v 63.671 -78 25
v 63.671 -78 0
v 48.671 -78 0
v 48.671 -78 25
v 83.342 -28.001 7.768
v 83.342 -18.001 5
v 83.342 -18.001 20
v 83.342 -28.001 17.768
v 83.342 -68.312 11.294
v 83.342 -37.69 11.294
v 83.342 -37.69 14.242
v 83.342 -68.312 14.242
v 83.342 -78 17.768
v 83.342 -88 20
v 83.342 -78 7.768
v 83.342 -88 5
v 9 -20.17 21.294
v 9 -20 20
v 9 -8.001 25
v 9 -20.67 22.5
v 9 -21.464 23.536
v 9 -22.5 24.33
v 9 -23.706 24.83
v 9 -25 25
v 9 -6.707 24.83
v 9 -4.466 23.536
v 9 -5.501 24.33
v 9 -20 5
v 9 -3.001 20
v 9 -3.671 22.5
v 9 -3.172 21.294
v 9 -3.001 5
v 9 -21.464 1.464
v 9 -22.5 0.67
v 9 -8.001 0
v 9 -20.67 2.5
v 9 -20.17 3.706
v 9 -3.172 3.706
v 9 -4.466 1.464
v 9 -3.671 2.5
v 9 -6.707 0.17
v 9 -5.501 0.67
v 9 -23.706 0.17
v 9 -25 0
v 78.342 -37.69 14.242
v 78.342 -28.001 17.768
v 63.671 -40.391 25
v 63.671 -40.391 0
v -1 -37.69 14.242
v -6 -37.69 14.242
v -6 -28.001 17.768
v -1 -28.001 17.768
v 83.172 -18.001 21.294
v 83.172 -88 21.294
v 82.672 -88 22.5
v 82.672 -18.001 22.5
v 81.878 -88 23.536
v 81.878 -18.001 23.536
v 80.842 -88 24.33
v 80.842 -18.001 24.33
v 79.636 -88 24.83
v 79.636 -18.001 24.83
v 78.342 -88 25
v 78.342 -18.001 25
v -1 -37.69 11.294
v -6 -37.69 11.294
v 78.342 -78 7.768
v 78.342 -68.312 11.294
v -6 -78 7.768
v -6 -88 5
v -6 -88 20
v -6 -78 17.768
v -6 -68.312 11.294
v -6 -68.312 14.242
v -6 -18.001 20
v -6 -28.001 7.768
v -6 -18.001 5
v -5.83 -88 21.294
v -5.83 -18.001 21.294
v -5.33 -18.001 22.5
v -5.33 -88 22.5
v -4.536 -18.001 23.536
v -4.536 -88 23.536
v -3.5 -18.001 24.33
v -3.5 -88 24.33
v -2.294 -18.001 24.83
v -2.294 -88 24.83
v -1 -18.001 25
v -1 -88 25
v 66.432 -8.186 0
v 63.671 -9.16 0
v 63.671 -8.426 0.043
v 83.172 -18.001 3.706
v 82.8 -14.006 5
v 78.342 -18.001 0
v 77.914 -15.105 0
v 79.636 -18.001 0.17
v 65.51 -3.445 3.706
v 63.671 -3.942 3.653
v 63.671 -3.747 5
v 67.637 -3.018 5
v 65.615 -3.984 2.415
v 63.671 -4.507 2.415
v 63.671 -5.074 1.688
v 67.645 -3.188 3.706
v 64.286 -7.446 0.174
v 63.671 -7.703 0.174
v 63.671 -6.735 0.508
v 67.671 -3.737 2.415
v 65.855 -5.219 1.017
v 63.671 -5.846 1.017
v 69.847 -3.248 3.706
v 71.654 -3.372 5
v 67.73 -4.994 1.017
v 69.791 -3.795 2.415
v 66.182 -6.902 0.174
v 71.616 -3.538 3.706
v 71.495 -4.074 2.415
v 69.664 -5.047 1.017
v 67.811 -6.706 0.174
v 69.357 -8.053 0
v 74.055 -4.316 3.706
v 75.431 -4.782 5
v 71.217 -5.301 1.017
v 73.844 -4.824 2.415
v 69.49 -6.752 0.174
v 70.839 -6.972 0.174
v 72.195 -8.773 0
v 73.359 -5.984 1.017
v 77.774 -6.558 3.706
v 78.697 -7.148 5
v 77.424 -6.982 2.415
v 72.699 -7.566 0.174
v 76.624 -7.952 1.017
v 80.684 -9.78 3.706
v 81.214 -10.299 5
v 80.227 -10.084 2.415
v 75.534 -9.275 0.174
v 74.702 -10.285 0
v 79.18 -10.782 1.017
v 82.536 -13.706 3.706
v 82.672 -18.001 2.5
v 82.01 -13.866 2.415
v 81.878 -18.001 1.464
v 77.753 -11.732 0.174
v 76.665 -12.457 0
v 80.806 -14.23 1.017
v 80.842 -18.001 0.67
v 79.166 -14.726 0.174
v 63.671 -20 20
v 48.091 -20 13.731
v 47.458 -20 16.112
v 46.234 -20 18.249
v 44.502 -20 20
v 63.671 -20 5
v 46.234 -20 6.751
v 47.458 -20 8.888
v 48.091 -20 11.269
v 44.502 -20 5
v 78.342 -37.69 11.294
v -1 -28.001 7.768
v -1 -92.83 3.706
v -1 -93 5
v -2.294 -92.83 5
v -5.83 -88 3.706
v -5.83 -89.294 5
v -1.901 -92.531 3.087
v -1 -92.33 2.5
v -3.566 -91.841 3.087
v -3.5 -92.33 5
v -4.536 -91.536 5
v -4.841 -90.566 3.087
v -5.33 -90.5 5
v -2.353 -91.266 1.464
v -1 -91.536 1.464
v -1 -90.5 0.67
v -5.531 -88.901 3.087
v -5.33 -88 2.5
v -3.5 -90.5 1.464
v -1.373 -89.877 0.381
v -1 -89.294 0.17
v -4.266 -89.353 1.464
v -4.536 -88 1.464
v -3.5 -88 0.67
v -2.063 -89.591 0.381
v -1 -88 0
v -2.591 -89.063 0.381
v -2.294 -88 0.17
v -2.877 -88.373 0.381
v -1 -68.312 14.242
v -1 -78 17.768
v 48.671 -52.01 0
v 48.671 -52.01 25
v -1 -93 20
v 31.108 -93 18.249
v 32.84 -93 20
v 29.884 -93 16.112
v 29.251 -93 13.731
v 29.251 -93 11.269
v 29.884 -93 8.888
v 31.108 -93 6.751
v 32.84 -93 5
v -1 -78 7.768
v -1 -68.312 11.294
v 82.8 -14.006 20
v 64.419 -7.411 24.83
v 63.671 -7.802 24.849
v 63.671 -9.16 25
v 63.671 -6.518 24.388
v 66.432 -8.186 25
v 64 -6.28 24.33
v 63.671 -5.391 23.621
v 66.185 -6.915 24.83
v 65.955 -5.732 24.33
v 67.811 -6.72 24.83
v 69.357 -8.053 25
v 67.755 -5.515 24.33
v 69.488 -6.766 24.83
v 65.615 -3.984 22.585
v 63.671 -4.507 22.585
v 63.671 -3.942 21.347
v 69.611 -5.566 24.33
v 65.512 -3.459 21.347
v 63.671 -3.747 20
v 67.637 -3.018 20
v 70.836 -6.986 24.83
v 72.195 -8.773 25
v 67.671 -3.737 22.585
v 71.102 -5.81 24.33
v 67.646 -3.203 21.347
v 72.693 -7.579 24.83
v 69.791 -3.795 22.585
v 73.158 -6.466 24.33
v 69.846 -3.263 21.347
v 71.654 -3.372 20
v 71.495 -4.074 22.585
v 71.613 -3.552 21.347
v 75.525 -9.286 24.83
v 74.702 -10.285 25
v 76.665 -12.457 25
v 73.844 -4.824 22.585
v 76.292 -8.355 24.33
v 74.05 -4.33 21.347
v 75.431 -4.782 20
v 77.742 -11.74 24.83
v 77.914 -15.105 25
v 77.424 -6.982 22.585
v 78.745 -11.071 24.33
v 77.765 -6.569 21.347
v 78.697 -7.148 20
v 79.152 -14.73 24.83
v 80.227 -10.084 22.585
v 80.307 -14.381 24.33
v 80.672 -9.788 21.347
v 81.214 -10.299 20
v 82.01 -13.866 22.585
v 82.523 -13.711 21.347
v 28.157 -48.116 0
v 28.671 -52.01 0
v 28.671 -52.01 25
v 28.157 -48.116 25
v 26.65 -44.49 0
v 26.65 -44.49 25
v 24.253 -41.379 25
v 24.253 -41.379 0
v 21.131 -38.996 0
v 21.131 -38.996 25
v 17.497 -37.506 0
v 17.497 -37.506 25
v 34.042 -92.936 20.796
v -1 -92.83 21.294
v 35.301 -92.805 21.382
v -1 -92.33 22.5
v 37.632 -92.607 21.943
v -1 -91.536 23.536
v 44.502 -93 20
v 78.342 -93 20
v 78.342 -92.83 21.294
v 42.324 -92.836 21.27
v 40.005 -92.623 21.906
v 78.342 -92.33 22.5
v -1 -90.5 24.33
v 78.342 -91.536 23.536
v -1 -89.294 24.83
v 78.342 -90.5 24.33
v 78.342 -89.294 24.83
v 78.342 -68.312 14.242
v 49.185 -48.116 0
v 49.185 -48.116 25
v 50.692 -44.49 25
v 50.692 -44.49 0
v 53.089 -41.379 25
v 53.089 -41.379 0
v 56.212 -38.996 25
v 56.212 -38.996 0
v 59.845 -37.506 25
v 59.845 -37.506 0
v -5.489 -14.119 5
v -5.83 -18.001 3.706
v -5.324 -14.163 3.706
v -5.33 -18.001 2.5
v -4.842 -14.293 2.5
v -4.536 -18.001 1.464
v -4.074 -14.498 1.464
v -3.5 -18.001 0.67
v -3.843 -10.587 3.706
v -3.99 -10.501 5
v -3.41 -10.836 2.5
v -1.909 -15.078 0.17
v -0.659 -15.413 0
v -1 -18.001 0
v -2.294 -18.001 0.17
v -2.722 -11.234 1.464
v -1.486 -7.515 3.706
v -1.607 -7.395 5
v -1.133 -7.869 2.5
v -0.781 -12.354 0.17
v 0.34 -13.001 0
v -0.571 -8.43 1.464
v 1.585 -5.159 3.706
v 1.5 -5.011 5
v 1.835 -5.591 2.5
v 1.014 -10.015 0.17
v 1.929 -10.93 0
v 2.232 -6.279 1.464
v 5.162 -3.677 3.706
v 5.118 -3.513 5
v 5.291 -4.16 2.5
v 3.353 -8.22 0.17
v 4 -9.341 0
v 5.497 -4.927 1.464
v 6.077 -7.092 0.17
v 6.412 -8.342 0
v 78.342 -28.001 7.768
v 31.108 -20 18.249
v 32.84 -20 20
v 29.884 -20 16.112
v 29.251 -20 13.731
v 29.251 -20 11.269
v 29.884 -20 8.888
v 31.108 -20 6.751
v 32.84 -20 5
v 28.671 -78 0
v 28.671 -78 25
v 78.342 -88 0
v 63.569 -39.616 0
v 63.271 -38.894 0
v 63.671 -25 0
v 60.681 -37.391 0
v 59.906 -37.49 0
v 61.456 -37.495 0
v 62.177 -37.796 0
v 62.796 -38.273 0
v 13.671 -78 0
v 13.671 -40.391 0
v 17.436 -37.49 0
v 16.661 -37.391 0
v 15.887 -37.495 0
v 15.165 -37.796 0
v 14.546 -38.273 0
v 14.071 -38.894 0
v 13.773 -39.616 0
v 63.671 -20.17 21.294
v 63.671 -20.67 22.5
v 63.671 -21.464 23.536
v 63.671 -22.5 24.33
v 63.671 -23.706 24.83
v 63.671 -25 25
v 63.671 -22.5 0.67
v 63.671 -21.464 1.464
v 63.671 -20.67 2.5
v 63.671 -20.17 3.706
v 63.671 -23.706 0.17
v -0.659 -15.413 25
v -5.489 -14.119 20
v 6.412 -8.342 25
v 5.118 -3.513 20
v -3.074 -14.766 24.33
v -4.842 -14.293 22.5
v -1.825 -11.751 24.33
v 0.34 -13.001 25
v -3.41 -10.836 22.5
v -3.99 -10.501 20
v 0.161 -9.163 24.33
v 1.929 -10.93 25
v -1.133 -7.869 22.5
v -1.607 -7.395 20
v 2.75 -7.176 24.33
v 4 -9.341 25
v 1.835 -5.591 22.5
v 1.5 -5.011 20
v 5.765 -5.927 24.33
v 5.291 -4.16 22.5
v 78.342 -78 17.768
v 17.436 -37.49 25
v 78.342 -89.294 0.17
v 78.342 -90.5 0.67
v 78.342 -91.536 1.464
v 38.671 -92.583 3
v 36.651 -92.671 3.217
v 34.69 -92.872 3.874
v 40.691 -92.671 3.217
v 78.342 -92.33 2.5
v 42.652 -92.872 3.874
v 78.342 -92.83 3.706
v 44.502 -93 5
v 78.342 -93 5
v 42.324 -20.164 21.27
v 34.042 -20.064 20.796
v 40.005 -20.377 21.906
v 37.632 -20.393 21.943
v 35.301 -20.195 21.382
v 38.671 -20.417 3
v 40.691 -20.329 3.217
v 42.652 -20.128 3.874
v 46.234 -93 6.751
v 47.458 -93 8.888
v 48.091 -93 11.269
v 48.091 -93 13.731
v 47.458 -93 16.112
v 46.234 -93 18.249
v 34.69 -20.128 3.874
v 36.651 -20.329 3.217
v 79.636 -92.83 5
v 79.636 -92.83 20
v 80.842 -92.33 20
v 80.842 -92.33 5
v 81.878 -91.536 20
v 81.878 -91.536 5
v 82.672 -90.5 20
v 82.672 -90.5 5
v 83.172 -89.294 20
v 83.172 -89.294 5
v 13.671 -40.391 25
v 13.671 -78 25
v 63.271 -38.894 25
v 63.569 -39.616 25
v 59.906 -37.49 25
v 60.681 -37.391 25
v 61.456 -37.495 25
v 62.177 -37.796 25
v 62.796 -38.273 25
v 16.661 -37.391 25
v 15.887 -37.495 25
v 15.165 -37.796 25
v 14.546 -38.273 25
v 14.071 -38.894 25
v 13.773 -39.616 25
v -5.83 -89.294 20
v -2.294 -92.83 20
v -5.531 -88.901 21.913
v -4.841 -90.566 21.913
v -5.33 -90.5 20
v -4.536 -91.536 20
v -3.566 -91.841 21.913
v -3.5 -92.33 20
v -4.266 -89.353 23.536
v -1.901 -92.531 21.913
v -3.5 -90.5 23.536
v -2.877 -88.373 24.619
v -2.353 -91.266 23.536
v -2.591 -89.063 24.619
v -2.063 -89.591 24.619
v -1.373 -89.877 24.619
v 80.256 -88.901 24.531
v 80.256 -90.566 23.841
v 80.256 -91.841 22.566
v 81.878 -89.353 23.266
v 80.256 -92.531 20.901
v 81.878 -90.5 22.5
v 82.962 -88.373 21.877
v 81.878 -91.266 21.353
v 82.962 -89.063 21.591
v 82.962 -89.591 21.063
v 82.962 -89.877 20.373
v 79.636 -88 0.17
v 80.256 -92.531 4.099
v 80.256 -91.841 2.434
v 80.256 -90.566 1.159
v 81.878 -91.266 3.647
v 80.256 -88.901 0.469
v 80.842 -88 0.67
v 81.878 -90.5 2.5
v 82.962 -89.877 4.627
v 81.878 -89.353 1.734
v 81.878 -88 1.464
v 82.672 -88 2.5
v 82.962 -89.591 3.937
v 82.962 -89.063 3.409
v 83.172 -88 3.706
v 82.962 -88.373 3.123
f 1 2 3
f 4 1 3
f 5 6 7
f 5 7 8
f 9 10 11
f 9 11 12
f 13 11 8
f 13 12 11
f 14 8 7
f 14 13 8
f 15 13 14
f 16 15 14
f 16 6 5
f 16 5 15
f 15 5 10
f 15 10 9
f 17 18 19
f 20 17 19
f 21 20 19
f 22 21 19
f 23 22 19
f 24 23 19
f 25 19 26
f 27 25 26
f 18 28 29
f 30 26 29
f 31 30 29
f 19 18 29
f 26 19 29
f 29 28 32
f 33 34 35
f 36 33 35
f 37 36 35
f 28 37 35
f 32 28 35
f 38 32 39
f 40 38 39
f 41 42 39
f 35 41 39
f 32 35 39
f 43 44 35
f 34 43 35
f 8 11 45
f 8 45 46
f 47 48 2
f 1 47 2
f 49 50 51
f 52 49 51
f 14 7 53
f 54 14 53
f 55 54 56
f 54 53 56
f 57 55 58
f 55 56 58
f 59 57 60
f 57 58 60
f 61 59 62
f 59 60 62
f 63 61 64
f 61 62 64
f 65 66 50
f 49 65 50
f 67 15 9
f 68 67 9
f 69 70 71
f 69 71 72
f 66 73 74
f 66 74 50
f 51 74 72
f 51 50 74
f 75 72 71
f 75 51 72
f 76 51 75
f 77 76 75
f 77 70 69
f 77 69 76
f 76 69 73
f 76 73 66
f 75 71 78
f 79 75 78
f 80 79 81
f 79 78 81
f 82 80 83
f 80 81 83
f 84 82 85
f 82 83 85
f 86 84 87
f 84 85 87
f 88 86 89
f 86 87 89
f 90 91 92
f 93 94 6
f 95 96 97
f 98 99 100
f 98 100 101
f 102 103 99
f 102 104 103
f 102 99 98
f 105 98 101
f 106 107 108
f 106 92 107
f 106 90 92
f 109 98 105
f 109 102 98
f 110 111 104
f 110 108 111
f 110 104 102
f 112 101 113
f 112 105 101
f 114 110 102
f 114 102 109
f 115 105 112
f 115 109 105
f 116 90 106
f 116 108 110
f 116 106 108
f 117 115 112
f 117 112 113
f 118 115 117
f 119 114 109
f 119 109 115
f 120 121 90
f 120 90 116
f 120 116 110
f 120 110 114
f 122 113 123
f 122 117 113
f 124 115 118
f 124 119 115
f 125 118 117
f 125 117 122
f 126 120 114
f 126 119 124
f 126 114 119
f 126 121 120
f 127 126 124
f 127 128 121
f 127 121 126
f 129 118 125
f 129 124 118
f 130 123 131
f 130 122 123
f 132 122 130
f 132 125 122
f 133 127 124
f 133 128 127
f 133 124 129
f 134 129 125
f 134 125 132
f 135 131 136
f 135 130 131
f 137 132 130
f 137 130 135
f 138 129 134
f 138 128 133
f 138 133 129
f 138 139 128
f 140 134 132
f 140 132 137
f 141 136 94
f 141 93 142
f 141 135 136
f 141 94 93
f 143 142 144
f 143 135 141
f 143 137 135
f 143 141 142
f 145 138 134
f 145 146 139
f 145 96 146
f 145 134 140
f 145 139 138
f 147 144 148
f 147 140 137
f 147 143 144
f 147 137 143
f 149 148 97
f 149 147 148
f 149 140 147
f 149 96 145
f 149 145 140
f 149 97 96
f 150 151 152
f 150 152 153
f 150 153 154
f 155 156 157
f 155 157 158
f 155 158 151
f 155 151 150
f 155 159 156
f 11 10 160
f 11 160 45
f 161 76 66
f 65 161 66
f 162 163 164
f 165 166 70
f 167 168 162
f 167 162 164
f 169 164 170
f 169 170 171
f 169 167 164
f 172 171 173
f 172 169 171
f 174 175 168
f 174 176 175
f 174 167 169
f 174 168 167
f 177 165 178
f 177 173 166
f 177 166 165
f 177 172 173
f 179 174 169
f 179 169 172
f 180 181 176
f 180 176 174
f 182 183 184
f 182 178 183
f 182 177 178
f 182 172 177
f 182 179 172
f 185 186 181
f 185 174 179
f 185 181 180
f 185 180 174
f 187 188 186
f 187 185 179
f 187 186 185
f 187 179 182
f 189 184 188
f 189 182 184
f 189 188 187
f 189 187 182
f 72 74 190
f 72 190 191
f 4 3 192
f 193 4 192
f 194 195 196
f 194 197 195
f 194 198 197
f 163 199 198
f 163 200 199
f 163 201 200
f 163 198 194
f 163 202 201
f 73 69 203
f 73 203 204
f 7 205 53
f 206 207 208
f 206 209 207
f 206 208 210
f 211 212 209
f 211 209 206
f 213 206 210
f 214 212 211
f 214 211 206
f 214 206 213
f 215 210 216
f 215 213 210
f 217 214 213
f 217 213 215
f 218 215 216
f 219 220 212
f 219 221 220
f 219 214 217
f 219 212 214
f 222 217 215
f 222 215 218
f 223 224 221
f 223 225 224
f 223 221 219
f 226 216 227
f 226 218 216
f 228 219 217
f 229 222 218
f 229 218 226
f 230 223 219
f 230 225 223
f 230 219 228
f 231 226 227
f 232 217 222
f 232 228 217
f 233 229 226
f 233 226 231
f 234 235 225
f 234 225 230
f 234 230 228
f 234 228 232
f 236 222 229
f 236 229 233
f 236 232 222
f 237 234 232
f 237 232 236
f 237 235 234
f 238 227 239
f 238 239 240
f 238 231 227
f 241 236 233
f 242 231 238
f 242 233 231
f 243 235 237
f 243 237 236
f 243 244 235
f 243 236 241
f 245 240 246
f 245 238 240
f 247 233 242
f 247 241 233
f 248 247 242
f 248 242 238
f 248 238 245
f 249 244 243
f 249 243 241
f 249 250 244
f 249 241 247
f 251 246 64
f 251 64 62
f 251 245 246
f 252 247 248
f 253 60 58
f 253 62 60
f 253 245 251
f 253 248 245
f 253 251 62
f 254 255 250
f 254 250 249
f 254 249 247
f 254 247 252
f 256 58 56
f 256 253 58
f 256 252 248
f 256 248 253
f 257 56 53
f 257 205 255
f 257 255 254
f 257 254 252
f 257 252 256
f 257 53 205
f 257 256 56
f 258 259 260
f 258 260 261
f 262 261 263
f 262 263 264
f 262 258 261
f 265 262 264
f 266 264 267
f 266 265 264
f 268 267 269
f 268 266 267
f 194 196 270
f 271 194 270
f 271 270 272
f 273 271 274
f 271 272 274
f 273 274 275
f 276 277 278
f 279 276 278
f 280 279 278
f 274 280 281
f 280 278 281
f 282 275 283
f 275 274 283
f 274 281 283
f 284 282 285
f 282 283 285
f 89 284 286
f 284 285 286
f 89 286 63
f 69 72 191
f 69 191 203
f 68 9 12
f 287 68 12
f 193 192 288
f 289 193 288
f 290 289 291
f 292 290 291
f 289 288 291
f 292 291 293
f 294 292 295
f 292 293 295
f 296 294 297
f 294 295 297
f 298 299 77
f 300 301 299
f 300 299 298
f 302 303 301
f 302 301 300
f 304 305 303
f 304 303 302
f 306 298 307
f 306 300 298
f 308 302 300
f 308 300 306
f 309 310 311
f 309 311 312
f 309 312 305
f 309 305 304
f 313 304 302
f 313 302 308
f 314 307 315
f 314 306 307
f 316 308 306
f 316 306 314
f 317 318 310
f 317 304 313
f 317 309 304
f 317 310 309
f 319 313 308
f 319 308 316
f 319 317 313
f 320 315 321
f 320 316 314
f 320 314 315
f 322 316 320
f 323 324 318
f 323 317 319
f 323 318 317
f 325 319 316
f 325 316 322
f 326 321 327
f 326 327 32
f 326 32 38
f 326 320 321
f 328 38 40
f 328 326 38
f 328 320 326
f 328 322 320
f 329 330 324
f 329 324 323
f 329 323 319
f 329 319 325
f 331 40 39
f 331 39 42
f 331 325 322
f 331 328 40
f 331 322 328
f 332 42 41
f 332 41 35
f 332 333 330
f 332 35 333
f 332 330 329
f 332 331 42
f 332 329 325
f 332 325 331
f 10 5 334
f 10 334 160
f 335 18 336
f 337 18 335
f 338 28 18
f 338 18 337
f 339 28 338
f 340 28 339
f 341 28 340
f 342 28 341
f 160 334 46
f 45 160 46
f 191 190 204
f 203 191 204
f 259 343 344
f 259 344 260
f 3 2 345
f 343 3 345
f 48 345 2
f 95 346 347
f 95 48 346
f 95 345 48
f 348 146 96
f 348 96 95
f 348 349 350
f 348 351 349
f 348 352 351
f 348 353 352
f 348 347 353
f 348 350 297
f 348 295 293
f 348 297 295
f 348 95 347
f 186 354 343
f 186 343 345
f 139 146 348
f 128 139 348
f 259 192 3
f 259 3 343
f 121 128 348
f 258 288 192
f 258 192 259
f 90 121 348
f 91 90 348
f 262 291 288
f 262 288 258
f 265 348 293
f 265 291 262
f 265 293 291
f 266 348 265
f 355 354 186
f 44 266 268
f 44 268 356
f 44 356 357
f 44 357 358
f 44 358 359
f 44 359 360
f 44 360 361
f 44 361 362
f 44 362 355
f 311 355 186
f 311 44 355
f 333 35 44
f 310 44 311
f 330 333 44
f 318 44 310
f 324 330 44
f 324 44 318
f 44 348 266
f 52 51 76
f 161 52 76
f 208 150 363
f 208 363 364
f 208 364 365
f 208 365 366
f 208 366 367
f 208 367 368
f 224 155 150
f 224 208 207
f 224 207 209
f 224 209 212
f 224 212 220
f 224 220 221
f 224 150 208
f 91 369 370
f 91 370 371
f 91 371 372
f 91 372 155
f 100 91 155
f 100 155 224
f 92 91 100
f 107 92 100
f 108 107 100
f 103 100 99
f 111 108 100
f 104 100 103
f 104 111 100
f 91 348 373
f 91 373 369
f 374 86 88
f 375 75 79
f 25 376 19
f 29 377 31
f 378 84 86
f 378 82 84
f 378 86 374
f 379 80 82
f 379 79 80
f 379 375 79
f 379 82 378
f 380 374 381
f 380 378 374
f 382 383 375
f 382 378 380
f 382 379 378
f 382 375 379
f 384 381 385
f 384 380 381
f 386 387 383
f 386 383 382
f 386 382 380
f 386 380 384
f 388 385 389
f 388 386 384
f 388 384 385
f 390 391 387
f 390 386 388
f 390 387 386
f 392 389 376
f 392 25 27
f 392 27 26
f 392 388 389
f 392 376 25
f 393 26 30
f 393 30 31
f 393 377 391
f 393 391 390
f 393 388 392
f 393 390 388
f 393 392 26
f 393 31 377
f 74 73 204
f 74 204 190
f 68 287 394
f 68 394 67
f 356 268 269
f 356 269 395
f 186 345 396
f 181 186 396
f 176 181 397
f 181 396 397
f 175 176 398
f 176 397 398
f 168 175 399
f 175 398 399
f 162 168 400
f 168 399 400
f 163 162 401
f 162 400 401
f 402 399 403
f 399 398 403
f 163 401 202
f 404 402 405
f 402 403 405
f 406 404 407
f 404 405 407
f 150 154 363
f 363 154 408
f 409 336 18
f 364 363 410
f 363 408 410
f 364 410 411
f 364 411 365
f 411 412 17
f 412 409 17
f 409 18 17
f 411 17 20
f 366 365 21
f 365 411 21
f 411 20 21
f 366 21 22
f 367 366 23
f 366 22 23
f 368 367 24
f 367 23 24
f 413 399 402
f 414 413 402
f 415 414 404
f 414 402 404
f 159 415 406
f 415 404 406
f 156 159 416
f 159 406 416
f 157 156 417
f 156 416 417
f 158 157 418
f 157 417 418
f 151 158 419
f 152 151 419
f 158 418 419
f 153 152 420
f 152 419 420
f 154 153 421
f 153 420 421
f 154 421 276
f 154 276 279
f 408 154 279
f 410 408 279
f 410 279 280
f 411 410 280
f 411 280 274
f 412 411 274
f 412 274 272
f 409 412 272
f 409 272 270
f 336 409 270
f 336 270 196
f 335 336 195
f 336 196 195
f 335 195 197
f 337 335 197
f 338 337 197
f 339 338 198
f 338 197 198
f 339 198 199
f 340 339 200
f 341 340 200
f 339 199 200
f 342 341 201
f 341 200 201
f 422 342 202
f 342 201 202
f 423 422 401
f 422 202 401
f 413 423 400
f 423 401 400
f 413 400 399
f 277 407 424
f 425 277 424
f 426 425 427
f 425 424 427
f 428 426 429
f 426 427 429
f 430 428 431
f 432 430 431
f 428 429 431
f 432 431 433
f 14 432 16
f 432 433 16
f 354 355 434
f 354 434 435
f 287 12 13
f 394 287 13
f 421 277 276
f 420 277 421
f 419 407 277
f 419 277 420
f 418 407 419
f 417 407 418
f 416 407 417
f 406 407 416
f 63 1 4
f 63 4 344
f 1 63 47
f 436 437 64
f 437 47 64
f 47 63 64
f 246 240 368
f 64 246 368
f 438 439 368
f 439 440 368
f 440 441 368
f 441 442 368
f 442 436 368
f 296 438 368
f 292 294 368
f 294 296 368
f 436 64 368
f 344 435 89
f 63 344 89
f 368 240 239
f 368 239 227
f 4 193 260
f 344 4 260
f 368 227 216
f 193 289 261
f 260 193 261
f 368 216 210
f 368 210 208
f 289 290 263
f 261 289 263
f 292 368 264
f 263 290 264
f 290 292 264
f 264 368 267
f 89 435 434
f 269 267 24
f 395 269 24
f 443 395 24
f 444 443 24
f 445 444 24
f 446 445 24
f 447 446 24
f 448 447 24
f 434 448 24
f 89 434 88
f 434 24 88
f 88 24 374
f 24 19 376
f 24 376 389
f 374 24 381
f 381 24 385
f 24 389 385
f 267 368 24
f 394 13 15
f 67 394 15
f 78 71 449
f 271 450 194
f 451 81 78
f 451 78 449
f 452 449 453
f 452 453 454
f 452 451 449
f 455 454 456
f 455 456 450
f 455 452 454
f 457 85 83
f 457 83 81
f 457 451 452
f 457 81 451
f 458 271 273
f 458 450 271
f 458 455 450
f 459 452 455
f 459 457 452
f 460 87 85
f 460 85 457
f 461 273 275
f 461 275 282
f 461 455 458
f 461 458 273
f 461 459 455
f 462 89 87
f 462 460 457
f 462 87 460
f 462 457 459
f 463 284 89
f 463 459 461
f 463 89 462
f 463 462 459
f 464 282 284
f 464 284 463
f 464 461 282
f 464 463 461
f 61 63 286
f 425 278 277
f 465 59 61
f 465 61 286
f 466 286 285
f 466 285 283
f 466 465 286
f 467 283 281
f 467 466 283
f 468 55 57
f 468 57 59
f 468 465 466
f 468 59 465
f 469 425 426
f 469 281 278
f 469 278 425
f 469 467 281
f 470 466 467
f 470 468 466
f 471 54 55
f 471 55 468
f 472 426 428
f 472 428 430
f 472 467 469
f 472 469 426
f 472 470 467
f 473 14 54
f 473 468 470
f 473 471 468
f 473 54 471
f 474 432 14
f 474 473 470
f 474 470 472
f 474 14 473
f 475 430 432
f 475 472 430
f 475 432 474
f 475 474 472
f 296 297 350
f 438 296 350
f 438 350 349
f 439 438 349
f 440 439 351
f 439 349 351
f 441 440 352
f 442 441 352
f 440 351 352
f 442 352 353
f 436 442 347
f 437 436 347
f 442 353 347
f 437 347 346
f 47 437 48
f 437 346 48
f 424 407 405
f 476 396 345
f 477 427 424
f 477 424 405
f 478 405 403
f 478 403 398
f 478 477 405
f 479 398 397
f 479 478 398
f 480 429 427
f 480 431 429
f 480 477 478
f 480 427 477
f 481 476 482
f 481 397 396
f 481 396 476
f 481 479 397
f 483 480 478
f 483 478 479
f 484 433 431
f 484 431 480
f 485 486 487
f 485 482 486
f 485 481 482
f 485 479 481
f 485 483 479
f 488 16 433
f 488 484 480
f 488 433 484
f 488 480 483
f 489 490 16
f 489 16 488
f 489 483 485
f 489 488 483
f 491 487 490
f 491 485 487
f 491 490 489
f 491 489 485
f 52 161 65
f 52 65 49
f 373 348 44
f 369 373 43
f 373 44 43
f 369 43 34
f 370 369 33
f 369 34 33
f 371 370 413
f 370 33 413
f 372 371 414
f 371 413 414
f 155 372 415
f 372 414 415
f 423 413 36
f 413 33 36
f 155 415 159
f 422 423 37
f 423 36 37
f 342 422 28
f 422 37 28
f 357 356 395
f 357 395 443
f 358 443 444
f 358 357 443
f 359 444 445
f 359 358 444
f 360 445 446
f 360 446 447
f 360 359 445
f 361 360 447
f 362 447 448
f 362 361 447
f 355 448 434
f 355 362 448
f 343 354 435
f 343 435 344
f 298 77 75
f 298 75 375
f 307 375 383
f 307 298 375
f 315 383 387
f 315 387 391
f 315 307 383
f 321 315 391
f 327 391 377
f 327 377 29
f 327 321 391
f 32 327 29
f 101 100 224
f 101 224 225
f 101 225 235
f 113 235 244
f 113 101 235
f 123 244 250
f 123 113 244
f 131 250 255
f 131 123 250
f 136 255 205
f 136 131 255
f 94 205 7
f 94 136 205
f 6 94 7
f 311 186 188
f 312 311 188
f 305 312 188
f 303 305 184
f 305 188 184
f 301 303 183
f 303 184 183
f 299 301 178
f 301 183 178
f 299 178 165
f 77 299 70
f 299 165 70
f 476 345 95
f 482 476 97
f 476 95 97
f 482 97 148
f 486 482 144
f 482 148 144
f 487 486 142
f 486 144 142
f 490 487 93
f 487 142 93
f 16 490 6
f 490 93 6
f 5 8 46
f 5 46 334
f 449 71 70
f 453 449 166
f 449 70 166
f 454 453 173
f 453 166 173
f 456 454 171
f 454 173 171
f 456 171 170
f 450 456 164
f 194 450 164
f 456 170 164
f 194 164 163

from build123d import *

# Parameters (mm, degrees)
BOSS_EXTRUDE1_DEPTH = 25
SKETCH2_R           = 9.5
CUT_EXTRUDE1_DEPTH  = 89
FILLET1_R           = 5
FILLET2_R           = 5
FILLET3_R           = 5
CUT_EXTRUDE2_DEPTH  = 5


with BuildPart() as part:
    # Sketch1 → Boss-Extrude1 (new body)
    with BuildSketch(Plane.XY):
        with BuildLine():
            Line((83.342336402, -18.001464661), (83.342336402, -93))
            Line((83.342336402, -93), (-6, -93))
            Line((-6, -93), (-6, -18.001464661))
            ThreePointArc((-6, -18.001464661), (-1.606601718, -7.394862943), (9, -3.001464661))
            Line((9, -3.001464661), (9, -20))
            Line((9, -20), (63.671168201, -20))
            Line((63.671168201, -20), (63.671168201, -3.747335869))
            ThreePointArc((63.671168201, -3.747335869), (77.143827099, -5.855117), (83.342336402, -18.001464661))
        make_face()
        with BuildLine():
            Line((63.671168201, -40.39084965), (63.671168201, -78))
            Line((63.671168201, -78), (48.671168201, -78))
            Line((48.671168201, -78), (48.671168201, -52.009969466))
            ThreePointArc((48.671168201, -52.009969466), (51.788643958, -42.855428646), (59.845250549, -37.506095703))
            Line((59.845250549, -37.506095703), (59.905984671, -37.490074897))
            ThreePointArc((59.905984671, -37.490074897), (62.502076365, -38.014344801), (63.671168201, -40.39084965))
        make_face(mode=Mode.SUBTRACT)
        with BuildLine():
            Line((28.671168201, -78), (28.671168201, -52.009969466))
            ThreePointArc((28.671168201, -52.009969466), (25.553692444, -42.855428646), (17.497085853, -37.506095703))
            Line((17.497085853, -37.506095703), (17.436351731, -37.490074897))
            ThreePointArc((17.436351731, -37.490074897), (14.840260037, -38.014344801), (13.671168201, -40.39084965))
            Line((13.671168201, -40.39084965), (13.671168201, -78))
            Line((13.671168201, -78), (28.671168201, -78))
        make_face(mode=Mode.SUBTRACT)
    extrude(amount=BOSS_EXTRUDE1_DEPTH)

    # Sketch2 → Cut-Extrude1 (cut)
    with BuildSketch(Plane.XZ.offset(93)):
        with Locations(Location((38.671168201, 12.5, 0), (0, 0, 270))):
            Circle(SKETCH2_R)
    extrude(amount=-CUT_EXTRUDE1_DEPTH, mode=Mode.SUBTRACT)

    # Fillet1
    # the kernel refuses this fillet: 5 mm, written as the material it takes off along each edge
    with BuildSketch(Plane(origin=(95.842336402, -93, 0), x_dir=(0, 1, 0), z_dir=(-1, 0, 0))) as fillet1_piece_1:
        with BuildLine():
            CenterArc((FILLET1_R, -FILLET1_R), FILLET1_R, 90, 90)
            Line((0, -FILLET1_R), (0, 0))
            Line((0, 0), (FILLET1_R, 0))
        make_face()
    extrude(amount=114.342336402, mode=Mode.SUBTRACT)
    with BuildSketch(Plane(origin=(83.342336402, -93, -12.5), x_dir=(0, 1, 0), z_dir=(0, 0, 1)), Plane(origin=(-6, -93, -12.5), x_dir=(1, 0, 0), z_dir=(0, 0, 1))) as fillet1_piece_2:
        with BuildLine():
            CenterArc((FILLET1_R, FILLET1_R), FILLET1_R, 180, 90)
            Line((0, FILLET1_R), (0, 0))
            Line((0, 0), (FILLET1_R, 0))
        make_face()
    extrude(amount=50, mode=Mode.SUBTRACT)
    with BuildSketch(Plane(origin=(95.842336402, -93, 25), x_dir=(0, 1, 0), z_dir=(-1, 0, 0))) as fillet1_piece_3:
        with BuildLine():
            CenterArc((FILLET1_R, FILLET1_R), FILLET1_R, 180, 90)
            Line((0, FILLET1_R), (0, 0))
            Line((0, 0), (FILLET1_R, 0))
        make_face()
    extrude(amount=114.342336402, mode=Mode.SUBTRACT)

    # Fillet2
    # the kernel refuses this fillet: 5 mm, written as the material it takes off along each edge
    with BuildSketch(Plane(origin=(78.342336402, -88, 20), x_dir=(0, 0, 1), z_dir=(1, 0, 0))) as fillet2_piece_1_section:
        Polygon((0, 0), (FILLET2_R * 1.02, 0), (FILLET2_R * 1.02, FILLET2_R * 1.02), (0, FILLET2_R * 1.02), align=None)
    fillet2_piece_1 = extrude(amount=FILLET2_R * 1.02, mode=Mode.PRIVATE)
    fillet2_piece_1 = fillet2_piece_1 - Plane(origin=(78.342336402, -88, 20), x_dir=(0, 0.7071067811865475, -0.7071067811865475), z_dir=(1, 0, 0)) * Sphere(FILLET2_R, mode=Mode.PRIVATE)
    add(fillet2_piece_1, mode=Mode.SUBTRACT)
    with BuildSketch(Plane(origin=(78.342336402, -88, 5), x_dir=(0, 0, -1), z_dir=(1, 0, 0))) as fillet2_piece_2_section:
        Polygon((0, 0), (FILLET2_R * 1.02, 0), (FILLET2_R * 1.02, -FILLET2_R * 1.02), (0, -FILLET2_R * 1.02), align=None)
    fillet2_piece_2 = extrude(amount=FILLET2_R * 1.02, mode=Mode.PRIVATE)
    fillet2_piece_2 = fillet2_piece_2 - Plane(origin=(78.342336402, -88, 5), x_dir=(0, 0.7071067811865475, 0.7071067811865475), z_dir=(1, 0, 0)) * Sphere(FILLET2_R, mode=Mode.PRIVATE)
    add(fillet2_piece_2, mode=Mode.SUBTRACT)
    with BuildSketch(Plane(origin=(-1, -88, 20), x_dir=(-1, 0, 0), z_dir=(0, 0, 1))) as fillet2_piece_3_section:
        Polygon((0, 0), (FILLET2_R * 1.02, 0), (FILLET2_R * 1.02, FILLET2_R * 1.02), (0, FILLET2_R * 1.02), align=None)
    fillet2_piece_3 = extrude(amount=FILLET2_R * 1.02, mode=Mode.PRIVATE)
    fillet2_piece_3 = fillet2_piece_3 - Plane(origin=(-1, -88, 20), x_dir=(0.7071067811865476, 0.7071067811865475, 0), z_dir=(0, 0, 1)) * Sphere(FILLET2_R, mode=Mode.PRIVATE)
    add(fillet2_piece_3, mode=Mode.SUBTRACT)
    with BuildSketch(Plane(origin=(-1, -88, 5), x_dir=(-1, 0, 0), z_dir=(0, 0, -1))) as fillet2_piece_4_section:
        Polygon((0, 0), (FILLET2_R * 1.02, 0), (FILLET2_R * 1.02, -FILLET2_R * 1.02), (0, -FILLET2_R * 1.02), align=None)
    fillet2_piece_4 = extrude(amount=FILLET2_R * 1.02, mode=Mode.PRIVATE)
    fillet2_piece_4 = fillet2_piece_4 - Plane(origin=(-1, -88, 5), x_dir=(0.7071067811865476, 0.7071067811865475, 0), z_dir=(0, 0, -1)) * Sphere(FILLET2_R, mode=Mode.PRIVATE)
    add(fillet2_piece_4, mode=Mode.SUBTRACT)
    with BuildSketch(Plane(origin=(68.342336402, -18.001464661, 0), x_dir=(-0.9129658100806721, 0.4080360641214722, 0), z_dir=(-0.4080360641214722, -0.9129658100806721, 0))) as fillet2_piece_5_section:
        with BuildLine():
            CenterArc((15 - FILLET2_R, -FILLET2_R), FILLET2_R, 0, 90)
            Line((15 - FILLET2_R, 0), (15 - FILLET2_R, FILLET2_R * 0.02))
            Line((15 - FILLET2_R, FILLET2_R * 0.02), (15 + FILLET2_R * 0.02, FILLET2_R * 0.02))
            Line((15 + FILLET2_R * 0.02, FILLET2_R * 0.02), (15 + FILLET2_R * 0.02, -FILLET2_R))
            Line((15 + FILLET2_R * 0.02, -FILLET2_R), (15, -FILLET2_R))
        make_face()
    fillet2_piece_5 = revolve(axis=Axis((68.342336402, -18.001464661, 0), (0, 0, -1)), revolution_arc=155.918477011, mode=Mode.PRIVATE)
    fillet2_piece_5 = split(fillet2_piece_5, bisect_by=Plane(origin=(63.671168201, -6.375046545, 1.425351683), z_dir=(1, 0, 0)), keep=Keep.TOP, mode=Mode.PRIVATE)
    add(fillet2_piece_5, mode=Mode.SUBTRACT)
    with BuildSketch(Plane(origin=(-6, -88, 0), x_dir=(1, 0, 0), z_dir=(0, 1, 0)), Plane(origin=(83.342336402, -18.001464661, 25), x_dir=(0, 0, -1), z_dir=(0, -1, 0))) as fillet2_piece_6:
        with BuildLine():
            CenterArc((FILLET2_R, -FILLET2_R), FILLET2_R, 90, 90)
            Line((0, -FILLET2_R), (-FILLET2_R * 0.02, -FILLET2_R))
            Line((-FILLET2_R * 0.02, -FILLET2_R), (-FILLET2_R * 0.02, FILLET2_R * 0.02))
            Line((-FILLET2_R * 0.02, FILLET2_R * 0.02), (FILLET2_R, FILLET2_R * 0.02))
            Line((FILLET2_R, FILLET2_R * 0.02), (FILLET2_R, 0))
        make_face()
    extrude(amount=69.998535339, mode=Mode.SUBTRACT)
    with BuildSketch(Plane(origin=(68.342336402, -18.001464661, 25), x_dir=(-0.9129658100806721, 0.4080360641214721, 0), z_dir=(-0.4080360641214721, -0.9129658100806721, 0))) as fillet2_piece_7_section:
        with BuildLine():
            CenterArc((15 - FILLET2_R, FILLET2_R), FILLET2_R, 270, 90)
            Line((15 - FILLET2_R, 0), (15 - FILLET2_R, -FILLET2_R * 0.02))
            Line((15 - FILLET2_R, -FILLET2_R * 0.02), (15 + FILLET2_R * 0.02, -FILLET2_R * 0.02))
            Line((15 + FILLET2_R * 0.02, -FILLET2_R * 0.02), (15 + FILLET2_R * 0.02, FILLET2_R))
            Line((15 + FILLET2_R * 0.02, FILLET2_R), (15, FILLET2_R))
        make_face()
    fillet2_piece_7 = revolve(axis=Axis((68.342336402, -18.001464661, 25), (0, 0, -1)), revolution_arc=155.918477011, mode=Mode.PRIVATE)
    fillet2_piece_7 = split(fillet2_piece_7, bisect_by=Plane(origin=(63.671168201, -6.375046545, 23.574648317), z_dir=(1, 0, 0)), keep=Keep.TOP, mode=Mode.PRIVATE)
    add(fillet2_piece_7, mode=Mode.SUBTRACT)
    with BuildSketch(Plane(origin=(9, -18.001464661, 25), x_dir=(-1, 0, 0), z_dir=(0, -1, 0))) as fillet2_piece_8:
        with BuildLine():
            CenterArc((15 - FILLET2_R, FILLET2_R), FILLET2_R, 270, 90)
            Line((15, FILLET2_R), (15 + FILLET2_R * 0.02, FILLET2_R))
            Line((15 + FILLET2_R * 0.02, FILLET2_R), (15 + FILLET2_R * 0.02, -FILLET2_R * 0.02))
            Line((15 + FILLET2_R * 0.02, -FILLET2_R * 0.02), (15 - FILLET2_R, -FILLET2_R * 0.02))
            Line((15 - FILLET2_R, -FILLET2_R * 0.02), (15 - FILLET2_R, 0))
        make_face()
    revolve(axis=Axis((9, -18.001464661, 25), (0, 0, -1)), revolution_arc=90, mode=Mode.SUBTRACT)
    with BuildSketch(Plane(origin=(-6, -88, 25), x_dir=(1, 0, 0), z_dir=(0, 1, 0)), Plane(origin=(83.342336402, -18.001464661, 0), x_dir=(0, 0, 1), z_dir=(0, -1, 0))) as fillet2_piece_9:
        with BuildLine():
            CenterArc((FILLET2_R, FILLET2_R), FILLET2_R, 180, 90)
            Line((0, FILLET2_R), (-FILLET2_R * 0.02, FILLET2_R))
            Line((-FILLET2_R * 0.02, FILLET2_R), (-FILLET2_R * 0.02, -FILLET2_R * 0.02))
            Line((-FILLET2_R * 0.02, -FILLET2_R * 0.02), (FILLET2_R, -FILLET2_R * 0.02))
            Line((FILLET2_R, -FILLET2_R * 0.02), (FILLET2_R, 0))
        make_face()
    extrude(amount=69.998535339, mode=Mode.SUBTRACT)
    with BuildSketch(Plane(origin=(9, -18.001464661, 0), x_dir=(-1, 0, 0), z_dir=(0, -1, 0))) as fillet2_piece_10:
        with BuildLine():
            CenterArc((15 - FILLET2_R, -FILLET2_R), FILLET2_R, 0, 90)
            Line((15, -FILLET2_R), (15 + FILLET2_R * 0.02, -FILLET2_R))
            Line((15 + FILLET2_R * 0.02, -FILLET2_R), (15 + FILLET2_R * 0.02, FILLET2_R * 0.02))
            Line((15 + FILLET2_R * 0.02, FILLET2_R * 0.02), (15 - FILLET2_R, FILLET2_R * 0.02))
            Line((15 - FILLET2_R, FILLET2_R * 0.02), (15 - FILLET2_R, 0))
        make_face()
    revolve(axis=Axis((9, -18.001464661, 0), (0, 0, -1)), revolution_arc=90, mode=Mode.SUBTRACT)

    # Fillet3
    # the kernel refuses this fillet: 5 mm, written as the material it takes off along each edge
    with BuildSketch(Plane(origin=(9, -20, 25), x_dir=(0, -1, 0), z_dir=(1, 0, 0))) as fillet3_piece_1:
        with BuildLine():
            CenterArc((FILLET3_R, FILLET3_R), FILLET3_R, 180, 90)
            Line((0, FILLET3_R), (0, 0))
            Line((0, 0), (FILLET3_R, 0))
        make_face()
    extrude(amount=54.671168201, mode=Mode.SUBTRACT)
    with BuildSketch(Plane(origin=(9, -20, 0), x_dir=(0, -1, 0), z_dir=(1, 0, 0))) as fillet3_piece_2:
        with BuildLine():
            CenterArc((FILLET3_R, -FILLET3_R), FILLET3_R, 90, 90)
            Line((0, -FILLET3_R), (0, 0))
            Line((0, 0), (FILLET3_R, 0))
        make_face()
    extrude(amount=54.671168201, mode=Mode.SUBTRACT)

    # Sketch3 → Cut-Extrude2 (cut)
    with BuildSketch(Plane(origin=(83.342336402, 0, 0), x_dir=(0, 0, -1), z_dir=(1, 0, 0))):
        Polygon((-17.768000409, -28.001464661), (-7.768000409, -28.001464661), (-11.294178767, -37.689560075), (-14.241822052, -37.689560075), align=None)
        Polygon((-11.294178767, -68.311904586), (-14.241822052, -68.311904586), (-17.768000409, -78), (-7.768000409, -78), align=None)
    cut_extrude2 = extrude(amount=-CUT_EXTRUDE2_DEPTH, mode=Mode.SUBTRACT)

    # Mirror1: Cut-Extrude2 across plane
    add(cut_extrude2.mirror(Plane(origin=(38.671168201, 0, 0), x_dir=(0, 0, 1), z_dir=(1, 0, 0))), mode=Mode.SUBTRACT)


solid = part.part
